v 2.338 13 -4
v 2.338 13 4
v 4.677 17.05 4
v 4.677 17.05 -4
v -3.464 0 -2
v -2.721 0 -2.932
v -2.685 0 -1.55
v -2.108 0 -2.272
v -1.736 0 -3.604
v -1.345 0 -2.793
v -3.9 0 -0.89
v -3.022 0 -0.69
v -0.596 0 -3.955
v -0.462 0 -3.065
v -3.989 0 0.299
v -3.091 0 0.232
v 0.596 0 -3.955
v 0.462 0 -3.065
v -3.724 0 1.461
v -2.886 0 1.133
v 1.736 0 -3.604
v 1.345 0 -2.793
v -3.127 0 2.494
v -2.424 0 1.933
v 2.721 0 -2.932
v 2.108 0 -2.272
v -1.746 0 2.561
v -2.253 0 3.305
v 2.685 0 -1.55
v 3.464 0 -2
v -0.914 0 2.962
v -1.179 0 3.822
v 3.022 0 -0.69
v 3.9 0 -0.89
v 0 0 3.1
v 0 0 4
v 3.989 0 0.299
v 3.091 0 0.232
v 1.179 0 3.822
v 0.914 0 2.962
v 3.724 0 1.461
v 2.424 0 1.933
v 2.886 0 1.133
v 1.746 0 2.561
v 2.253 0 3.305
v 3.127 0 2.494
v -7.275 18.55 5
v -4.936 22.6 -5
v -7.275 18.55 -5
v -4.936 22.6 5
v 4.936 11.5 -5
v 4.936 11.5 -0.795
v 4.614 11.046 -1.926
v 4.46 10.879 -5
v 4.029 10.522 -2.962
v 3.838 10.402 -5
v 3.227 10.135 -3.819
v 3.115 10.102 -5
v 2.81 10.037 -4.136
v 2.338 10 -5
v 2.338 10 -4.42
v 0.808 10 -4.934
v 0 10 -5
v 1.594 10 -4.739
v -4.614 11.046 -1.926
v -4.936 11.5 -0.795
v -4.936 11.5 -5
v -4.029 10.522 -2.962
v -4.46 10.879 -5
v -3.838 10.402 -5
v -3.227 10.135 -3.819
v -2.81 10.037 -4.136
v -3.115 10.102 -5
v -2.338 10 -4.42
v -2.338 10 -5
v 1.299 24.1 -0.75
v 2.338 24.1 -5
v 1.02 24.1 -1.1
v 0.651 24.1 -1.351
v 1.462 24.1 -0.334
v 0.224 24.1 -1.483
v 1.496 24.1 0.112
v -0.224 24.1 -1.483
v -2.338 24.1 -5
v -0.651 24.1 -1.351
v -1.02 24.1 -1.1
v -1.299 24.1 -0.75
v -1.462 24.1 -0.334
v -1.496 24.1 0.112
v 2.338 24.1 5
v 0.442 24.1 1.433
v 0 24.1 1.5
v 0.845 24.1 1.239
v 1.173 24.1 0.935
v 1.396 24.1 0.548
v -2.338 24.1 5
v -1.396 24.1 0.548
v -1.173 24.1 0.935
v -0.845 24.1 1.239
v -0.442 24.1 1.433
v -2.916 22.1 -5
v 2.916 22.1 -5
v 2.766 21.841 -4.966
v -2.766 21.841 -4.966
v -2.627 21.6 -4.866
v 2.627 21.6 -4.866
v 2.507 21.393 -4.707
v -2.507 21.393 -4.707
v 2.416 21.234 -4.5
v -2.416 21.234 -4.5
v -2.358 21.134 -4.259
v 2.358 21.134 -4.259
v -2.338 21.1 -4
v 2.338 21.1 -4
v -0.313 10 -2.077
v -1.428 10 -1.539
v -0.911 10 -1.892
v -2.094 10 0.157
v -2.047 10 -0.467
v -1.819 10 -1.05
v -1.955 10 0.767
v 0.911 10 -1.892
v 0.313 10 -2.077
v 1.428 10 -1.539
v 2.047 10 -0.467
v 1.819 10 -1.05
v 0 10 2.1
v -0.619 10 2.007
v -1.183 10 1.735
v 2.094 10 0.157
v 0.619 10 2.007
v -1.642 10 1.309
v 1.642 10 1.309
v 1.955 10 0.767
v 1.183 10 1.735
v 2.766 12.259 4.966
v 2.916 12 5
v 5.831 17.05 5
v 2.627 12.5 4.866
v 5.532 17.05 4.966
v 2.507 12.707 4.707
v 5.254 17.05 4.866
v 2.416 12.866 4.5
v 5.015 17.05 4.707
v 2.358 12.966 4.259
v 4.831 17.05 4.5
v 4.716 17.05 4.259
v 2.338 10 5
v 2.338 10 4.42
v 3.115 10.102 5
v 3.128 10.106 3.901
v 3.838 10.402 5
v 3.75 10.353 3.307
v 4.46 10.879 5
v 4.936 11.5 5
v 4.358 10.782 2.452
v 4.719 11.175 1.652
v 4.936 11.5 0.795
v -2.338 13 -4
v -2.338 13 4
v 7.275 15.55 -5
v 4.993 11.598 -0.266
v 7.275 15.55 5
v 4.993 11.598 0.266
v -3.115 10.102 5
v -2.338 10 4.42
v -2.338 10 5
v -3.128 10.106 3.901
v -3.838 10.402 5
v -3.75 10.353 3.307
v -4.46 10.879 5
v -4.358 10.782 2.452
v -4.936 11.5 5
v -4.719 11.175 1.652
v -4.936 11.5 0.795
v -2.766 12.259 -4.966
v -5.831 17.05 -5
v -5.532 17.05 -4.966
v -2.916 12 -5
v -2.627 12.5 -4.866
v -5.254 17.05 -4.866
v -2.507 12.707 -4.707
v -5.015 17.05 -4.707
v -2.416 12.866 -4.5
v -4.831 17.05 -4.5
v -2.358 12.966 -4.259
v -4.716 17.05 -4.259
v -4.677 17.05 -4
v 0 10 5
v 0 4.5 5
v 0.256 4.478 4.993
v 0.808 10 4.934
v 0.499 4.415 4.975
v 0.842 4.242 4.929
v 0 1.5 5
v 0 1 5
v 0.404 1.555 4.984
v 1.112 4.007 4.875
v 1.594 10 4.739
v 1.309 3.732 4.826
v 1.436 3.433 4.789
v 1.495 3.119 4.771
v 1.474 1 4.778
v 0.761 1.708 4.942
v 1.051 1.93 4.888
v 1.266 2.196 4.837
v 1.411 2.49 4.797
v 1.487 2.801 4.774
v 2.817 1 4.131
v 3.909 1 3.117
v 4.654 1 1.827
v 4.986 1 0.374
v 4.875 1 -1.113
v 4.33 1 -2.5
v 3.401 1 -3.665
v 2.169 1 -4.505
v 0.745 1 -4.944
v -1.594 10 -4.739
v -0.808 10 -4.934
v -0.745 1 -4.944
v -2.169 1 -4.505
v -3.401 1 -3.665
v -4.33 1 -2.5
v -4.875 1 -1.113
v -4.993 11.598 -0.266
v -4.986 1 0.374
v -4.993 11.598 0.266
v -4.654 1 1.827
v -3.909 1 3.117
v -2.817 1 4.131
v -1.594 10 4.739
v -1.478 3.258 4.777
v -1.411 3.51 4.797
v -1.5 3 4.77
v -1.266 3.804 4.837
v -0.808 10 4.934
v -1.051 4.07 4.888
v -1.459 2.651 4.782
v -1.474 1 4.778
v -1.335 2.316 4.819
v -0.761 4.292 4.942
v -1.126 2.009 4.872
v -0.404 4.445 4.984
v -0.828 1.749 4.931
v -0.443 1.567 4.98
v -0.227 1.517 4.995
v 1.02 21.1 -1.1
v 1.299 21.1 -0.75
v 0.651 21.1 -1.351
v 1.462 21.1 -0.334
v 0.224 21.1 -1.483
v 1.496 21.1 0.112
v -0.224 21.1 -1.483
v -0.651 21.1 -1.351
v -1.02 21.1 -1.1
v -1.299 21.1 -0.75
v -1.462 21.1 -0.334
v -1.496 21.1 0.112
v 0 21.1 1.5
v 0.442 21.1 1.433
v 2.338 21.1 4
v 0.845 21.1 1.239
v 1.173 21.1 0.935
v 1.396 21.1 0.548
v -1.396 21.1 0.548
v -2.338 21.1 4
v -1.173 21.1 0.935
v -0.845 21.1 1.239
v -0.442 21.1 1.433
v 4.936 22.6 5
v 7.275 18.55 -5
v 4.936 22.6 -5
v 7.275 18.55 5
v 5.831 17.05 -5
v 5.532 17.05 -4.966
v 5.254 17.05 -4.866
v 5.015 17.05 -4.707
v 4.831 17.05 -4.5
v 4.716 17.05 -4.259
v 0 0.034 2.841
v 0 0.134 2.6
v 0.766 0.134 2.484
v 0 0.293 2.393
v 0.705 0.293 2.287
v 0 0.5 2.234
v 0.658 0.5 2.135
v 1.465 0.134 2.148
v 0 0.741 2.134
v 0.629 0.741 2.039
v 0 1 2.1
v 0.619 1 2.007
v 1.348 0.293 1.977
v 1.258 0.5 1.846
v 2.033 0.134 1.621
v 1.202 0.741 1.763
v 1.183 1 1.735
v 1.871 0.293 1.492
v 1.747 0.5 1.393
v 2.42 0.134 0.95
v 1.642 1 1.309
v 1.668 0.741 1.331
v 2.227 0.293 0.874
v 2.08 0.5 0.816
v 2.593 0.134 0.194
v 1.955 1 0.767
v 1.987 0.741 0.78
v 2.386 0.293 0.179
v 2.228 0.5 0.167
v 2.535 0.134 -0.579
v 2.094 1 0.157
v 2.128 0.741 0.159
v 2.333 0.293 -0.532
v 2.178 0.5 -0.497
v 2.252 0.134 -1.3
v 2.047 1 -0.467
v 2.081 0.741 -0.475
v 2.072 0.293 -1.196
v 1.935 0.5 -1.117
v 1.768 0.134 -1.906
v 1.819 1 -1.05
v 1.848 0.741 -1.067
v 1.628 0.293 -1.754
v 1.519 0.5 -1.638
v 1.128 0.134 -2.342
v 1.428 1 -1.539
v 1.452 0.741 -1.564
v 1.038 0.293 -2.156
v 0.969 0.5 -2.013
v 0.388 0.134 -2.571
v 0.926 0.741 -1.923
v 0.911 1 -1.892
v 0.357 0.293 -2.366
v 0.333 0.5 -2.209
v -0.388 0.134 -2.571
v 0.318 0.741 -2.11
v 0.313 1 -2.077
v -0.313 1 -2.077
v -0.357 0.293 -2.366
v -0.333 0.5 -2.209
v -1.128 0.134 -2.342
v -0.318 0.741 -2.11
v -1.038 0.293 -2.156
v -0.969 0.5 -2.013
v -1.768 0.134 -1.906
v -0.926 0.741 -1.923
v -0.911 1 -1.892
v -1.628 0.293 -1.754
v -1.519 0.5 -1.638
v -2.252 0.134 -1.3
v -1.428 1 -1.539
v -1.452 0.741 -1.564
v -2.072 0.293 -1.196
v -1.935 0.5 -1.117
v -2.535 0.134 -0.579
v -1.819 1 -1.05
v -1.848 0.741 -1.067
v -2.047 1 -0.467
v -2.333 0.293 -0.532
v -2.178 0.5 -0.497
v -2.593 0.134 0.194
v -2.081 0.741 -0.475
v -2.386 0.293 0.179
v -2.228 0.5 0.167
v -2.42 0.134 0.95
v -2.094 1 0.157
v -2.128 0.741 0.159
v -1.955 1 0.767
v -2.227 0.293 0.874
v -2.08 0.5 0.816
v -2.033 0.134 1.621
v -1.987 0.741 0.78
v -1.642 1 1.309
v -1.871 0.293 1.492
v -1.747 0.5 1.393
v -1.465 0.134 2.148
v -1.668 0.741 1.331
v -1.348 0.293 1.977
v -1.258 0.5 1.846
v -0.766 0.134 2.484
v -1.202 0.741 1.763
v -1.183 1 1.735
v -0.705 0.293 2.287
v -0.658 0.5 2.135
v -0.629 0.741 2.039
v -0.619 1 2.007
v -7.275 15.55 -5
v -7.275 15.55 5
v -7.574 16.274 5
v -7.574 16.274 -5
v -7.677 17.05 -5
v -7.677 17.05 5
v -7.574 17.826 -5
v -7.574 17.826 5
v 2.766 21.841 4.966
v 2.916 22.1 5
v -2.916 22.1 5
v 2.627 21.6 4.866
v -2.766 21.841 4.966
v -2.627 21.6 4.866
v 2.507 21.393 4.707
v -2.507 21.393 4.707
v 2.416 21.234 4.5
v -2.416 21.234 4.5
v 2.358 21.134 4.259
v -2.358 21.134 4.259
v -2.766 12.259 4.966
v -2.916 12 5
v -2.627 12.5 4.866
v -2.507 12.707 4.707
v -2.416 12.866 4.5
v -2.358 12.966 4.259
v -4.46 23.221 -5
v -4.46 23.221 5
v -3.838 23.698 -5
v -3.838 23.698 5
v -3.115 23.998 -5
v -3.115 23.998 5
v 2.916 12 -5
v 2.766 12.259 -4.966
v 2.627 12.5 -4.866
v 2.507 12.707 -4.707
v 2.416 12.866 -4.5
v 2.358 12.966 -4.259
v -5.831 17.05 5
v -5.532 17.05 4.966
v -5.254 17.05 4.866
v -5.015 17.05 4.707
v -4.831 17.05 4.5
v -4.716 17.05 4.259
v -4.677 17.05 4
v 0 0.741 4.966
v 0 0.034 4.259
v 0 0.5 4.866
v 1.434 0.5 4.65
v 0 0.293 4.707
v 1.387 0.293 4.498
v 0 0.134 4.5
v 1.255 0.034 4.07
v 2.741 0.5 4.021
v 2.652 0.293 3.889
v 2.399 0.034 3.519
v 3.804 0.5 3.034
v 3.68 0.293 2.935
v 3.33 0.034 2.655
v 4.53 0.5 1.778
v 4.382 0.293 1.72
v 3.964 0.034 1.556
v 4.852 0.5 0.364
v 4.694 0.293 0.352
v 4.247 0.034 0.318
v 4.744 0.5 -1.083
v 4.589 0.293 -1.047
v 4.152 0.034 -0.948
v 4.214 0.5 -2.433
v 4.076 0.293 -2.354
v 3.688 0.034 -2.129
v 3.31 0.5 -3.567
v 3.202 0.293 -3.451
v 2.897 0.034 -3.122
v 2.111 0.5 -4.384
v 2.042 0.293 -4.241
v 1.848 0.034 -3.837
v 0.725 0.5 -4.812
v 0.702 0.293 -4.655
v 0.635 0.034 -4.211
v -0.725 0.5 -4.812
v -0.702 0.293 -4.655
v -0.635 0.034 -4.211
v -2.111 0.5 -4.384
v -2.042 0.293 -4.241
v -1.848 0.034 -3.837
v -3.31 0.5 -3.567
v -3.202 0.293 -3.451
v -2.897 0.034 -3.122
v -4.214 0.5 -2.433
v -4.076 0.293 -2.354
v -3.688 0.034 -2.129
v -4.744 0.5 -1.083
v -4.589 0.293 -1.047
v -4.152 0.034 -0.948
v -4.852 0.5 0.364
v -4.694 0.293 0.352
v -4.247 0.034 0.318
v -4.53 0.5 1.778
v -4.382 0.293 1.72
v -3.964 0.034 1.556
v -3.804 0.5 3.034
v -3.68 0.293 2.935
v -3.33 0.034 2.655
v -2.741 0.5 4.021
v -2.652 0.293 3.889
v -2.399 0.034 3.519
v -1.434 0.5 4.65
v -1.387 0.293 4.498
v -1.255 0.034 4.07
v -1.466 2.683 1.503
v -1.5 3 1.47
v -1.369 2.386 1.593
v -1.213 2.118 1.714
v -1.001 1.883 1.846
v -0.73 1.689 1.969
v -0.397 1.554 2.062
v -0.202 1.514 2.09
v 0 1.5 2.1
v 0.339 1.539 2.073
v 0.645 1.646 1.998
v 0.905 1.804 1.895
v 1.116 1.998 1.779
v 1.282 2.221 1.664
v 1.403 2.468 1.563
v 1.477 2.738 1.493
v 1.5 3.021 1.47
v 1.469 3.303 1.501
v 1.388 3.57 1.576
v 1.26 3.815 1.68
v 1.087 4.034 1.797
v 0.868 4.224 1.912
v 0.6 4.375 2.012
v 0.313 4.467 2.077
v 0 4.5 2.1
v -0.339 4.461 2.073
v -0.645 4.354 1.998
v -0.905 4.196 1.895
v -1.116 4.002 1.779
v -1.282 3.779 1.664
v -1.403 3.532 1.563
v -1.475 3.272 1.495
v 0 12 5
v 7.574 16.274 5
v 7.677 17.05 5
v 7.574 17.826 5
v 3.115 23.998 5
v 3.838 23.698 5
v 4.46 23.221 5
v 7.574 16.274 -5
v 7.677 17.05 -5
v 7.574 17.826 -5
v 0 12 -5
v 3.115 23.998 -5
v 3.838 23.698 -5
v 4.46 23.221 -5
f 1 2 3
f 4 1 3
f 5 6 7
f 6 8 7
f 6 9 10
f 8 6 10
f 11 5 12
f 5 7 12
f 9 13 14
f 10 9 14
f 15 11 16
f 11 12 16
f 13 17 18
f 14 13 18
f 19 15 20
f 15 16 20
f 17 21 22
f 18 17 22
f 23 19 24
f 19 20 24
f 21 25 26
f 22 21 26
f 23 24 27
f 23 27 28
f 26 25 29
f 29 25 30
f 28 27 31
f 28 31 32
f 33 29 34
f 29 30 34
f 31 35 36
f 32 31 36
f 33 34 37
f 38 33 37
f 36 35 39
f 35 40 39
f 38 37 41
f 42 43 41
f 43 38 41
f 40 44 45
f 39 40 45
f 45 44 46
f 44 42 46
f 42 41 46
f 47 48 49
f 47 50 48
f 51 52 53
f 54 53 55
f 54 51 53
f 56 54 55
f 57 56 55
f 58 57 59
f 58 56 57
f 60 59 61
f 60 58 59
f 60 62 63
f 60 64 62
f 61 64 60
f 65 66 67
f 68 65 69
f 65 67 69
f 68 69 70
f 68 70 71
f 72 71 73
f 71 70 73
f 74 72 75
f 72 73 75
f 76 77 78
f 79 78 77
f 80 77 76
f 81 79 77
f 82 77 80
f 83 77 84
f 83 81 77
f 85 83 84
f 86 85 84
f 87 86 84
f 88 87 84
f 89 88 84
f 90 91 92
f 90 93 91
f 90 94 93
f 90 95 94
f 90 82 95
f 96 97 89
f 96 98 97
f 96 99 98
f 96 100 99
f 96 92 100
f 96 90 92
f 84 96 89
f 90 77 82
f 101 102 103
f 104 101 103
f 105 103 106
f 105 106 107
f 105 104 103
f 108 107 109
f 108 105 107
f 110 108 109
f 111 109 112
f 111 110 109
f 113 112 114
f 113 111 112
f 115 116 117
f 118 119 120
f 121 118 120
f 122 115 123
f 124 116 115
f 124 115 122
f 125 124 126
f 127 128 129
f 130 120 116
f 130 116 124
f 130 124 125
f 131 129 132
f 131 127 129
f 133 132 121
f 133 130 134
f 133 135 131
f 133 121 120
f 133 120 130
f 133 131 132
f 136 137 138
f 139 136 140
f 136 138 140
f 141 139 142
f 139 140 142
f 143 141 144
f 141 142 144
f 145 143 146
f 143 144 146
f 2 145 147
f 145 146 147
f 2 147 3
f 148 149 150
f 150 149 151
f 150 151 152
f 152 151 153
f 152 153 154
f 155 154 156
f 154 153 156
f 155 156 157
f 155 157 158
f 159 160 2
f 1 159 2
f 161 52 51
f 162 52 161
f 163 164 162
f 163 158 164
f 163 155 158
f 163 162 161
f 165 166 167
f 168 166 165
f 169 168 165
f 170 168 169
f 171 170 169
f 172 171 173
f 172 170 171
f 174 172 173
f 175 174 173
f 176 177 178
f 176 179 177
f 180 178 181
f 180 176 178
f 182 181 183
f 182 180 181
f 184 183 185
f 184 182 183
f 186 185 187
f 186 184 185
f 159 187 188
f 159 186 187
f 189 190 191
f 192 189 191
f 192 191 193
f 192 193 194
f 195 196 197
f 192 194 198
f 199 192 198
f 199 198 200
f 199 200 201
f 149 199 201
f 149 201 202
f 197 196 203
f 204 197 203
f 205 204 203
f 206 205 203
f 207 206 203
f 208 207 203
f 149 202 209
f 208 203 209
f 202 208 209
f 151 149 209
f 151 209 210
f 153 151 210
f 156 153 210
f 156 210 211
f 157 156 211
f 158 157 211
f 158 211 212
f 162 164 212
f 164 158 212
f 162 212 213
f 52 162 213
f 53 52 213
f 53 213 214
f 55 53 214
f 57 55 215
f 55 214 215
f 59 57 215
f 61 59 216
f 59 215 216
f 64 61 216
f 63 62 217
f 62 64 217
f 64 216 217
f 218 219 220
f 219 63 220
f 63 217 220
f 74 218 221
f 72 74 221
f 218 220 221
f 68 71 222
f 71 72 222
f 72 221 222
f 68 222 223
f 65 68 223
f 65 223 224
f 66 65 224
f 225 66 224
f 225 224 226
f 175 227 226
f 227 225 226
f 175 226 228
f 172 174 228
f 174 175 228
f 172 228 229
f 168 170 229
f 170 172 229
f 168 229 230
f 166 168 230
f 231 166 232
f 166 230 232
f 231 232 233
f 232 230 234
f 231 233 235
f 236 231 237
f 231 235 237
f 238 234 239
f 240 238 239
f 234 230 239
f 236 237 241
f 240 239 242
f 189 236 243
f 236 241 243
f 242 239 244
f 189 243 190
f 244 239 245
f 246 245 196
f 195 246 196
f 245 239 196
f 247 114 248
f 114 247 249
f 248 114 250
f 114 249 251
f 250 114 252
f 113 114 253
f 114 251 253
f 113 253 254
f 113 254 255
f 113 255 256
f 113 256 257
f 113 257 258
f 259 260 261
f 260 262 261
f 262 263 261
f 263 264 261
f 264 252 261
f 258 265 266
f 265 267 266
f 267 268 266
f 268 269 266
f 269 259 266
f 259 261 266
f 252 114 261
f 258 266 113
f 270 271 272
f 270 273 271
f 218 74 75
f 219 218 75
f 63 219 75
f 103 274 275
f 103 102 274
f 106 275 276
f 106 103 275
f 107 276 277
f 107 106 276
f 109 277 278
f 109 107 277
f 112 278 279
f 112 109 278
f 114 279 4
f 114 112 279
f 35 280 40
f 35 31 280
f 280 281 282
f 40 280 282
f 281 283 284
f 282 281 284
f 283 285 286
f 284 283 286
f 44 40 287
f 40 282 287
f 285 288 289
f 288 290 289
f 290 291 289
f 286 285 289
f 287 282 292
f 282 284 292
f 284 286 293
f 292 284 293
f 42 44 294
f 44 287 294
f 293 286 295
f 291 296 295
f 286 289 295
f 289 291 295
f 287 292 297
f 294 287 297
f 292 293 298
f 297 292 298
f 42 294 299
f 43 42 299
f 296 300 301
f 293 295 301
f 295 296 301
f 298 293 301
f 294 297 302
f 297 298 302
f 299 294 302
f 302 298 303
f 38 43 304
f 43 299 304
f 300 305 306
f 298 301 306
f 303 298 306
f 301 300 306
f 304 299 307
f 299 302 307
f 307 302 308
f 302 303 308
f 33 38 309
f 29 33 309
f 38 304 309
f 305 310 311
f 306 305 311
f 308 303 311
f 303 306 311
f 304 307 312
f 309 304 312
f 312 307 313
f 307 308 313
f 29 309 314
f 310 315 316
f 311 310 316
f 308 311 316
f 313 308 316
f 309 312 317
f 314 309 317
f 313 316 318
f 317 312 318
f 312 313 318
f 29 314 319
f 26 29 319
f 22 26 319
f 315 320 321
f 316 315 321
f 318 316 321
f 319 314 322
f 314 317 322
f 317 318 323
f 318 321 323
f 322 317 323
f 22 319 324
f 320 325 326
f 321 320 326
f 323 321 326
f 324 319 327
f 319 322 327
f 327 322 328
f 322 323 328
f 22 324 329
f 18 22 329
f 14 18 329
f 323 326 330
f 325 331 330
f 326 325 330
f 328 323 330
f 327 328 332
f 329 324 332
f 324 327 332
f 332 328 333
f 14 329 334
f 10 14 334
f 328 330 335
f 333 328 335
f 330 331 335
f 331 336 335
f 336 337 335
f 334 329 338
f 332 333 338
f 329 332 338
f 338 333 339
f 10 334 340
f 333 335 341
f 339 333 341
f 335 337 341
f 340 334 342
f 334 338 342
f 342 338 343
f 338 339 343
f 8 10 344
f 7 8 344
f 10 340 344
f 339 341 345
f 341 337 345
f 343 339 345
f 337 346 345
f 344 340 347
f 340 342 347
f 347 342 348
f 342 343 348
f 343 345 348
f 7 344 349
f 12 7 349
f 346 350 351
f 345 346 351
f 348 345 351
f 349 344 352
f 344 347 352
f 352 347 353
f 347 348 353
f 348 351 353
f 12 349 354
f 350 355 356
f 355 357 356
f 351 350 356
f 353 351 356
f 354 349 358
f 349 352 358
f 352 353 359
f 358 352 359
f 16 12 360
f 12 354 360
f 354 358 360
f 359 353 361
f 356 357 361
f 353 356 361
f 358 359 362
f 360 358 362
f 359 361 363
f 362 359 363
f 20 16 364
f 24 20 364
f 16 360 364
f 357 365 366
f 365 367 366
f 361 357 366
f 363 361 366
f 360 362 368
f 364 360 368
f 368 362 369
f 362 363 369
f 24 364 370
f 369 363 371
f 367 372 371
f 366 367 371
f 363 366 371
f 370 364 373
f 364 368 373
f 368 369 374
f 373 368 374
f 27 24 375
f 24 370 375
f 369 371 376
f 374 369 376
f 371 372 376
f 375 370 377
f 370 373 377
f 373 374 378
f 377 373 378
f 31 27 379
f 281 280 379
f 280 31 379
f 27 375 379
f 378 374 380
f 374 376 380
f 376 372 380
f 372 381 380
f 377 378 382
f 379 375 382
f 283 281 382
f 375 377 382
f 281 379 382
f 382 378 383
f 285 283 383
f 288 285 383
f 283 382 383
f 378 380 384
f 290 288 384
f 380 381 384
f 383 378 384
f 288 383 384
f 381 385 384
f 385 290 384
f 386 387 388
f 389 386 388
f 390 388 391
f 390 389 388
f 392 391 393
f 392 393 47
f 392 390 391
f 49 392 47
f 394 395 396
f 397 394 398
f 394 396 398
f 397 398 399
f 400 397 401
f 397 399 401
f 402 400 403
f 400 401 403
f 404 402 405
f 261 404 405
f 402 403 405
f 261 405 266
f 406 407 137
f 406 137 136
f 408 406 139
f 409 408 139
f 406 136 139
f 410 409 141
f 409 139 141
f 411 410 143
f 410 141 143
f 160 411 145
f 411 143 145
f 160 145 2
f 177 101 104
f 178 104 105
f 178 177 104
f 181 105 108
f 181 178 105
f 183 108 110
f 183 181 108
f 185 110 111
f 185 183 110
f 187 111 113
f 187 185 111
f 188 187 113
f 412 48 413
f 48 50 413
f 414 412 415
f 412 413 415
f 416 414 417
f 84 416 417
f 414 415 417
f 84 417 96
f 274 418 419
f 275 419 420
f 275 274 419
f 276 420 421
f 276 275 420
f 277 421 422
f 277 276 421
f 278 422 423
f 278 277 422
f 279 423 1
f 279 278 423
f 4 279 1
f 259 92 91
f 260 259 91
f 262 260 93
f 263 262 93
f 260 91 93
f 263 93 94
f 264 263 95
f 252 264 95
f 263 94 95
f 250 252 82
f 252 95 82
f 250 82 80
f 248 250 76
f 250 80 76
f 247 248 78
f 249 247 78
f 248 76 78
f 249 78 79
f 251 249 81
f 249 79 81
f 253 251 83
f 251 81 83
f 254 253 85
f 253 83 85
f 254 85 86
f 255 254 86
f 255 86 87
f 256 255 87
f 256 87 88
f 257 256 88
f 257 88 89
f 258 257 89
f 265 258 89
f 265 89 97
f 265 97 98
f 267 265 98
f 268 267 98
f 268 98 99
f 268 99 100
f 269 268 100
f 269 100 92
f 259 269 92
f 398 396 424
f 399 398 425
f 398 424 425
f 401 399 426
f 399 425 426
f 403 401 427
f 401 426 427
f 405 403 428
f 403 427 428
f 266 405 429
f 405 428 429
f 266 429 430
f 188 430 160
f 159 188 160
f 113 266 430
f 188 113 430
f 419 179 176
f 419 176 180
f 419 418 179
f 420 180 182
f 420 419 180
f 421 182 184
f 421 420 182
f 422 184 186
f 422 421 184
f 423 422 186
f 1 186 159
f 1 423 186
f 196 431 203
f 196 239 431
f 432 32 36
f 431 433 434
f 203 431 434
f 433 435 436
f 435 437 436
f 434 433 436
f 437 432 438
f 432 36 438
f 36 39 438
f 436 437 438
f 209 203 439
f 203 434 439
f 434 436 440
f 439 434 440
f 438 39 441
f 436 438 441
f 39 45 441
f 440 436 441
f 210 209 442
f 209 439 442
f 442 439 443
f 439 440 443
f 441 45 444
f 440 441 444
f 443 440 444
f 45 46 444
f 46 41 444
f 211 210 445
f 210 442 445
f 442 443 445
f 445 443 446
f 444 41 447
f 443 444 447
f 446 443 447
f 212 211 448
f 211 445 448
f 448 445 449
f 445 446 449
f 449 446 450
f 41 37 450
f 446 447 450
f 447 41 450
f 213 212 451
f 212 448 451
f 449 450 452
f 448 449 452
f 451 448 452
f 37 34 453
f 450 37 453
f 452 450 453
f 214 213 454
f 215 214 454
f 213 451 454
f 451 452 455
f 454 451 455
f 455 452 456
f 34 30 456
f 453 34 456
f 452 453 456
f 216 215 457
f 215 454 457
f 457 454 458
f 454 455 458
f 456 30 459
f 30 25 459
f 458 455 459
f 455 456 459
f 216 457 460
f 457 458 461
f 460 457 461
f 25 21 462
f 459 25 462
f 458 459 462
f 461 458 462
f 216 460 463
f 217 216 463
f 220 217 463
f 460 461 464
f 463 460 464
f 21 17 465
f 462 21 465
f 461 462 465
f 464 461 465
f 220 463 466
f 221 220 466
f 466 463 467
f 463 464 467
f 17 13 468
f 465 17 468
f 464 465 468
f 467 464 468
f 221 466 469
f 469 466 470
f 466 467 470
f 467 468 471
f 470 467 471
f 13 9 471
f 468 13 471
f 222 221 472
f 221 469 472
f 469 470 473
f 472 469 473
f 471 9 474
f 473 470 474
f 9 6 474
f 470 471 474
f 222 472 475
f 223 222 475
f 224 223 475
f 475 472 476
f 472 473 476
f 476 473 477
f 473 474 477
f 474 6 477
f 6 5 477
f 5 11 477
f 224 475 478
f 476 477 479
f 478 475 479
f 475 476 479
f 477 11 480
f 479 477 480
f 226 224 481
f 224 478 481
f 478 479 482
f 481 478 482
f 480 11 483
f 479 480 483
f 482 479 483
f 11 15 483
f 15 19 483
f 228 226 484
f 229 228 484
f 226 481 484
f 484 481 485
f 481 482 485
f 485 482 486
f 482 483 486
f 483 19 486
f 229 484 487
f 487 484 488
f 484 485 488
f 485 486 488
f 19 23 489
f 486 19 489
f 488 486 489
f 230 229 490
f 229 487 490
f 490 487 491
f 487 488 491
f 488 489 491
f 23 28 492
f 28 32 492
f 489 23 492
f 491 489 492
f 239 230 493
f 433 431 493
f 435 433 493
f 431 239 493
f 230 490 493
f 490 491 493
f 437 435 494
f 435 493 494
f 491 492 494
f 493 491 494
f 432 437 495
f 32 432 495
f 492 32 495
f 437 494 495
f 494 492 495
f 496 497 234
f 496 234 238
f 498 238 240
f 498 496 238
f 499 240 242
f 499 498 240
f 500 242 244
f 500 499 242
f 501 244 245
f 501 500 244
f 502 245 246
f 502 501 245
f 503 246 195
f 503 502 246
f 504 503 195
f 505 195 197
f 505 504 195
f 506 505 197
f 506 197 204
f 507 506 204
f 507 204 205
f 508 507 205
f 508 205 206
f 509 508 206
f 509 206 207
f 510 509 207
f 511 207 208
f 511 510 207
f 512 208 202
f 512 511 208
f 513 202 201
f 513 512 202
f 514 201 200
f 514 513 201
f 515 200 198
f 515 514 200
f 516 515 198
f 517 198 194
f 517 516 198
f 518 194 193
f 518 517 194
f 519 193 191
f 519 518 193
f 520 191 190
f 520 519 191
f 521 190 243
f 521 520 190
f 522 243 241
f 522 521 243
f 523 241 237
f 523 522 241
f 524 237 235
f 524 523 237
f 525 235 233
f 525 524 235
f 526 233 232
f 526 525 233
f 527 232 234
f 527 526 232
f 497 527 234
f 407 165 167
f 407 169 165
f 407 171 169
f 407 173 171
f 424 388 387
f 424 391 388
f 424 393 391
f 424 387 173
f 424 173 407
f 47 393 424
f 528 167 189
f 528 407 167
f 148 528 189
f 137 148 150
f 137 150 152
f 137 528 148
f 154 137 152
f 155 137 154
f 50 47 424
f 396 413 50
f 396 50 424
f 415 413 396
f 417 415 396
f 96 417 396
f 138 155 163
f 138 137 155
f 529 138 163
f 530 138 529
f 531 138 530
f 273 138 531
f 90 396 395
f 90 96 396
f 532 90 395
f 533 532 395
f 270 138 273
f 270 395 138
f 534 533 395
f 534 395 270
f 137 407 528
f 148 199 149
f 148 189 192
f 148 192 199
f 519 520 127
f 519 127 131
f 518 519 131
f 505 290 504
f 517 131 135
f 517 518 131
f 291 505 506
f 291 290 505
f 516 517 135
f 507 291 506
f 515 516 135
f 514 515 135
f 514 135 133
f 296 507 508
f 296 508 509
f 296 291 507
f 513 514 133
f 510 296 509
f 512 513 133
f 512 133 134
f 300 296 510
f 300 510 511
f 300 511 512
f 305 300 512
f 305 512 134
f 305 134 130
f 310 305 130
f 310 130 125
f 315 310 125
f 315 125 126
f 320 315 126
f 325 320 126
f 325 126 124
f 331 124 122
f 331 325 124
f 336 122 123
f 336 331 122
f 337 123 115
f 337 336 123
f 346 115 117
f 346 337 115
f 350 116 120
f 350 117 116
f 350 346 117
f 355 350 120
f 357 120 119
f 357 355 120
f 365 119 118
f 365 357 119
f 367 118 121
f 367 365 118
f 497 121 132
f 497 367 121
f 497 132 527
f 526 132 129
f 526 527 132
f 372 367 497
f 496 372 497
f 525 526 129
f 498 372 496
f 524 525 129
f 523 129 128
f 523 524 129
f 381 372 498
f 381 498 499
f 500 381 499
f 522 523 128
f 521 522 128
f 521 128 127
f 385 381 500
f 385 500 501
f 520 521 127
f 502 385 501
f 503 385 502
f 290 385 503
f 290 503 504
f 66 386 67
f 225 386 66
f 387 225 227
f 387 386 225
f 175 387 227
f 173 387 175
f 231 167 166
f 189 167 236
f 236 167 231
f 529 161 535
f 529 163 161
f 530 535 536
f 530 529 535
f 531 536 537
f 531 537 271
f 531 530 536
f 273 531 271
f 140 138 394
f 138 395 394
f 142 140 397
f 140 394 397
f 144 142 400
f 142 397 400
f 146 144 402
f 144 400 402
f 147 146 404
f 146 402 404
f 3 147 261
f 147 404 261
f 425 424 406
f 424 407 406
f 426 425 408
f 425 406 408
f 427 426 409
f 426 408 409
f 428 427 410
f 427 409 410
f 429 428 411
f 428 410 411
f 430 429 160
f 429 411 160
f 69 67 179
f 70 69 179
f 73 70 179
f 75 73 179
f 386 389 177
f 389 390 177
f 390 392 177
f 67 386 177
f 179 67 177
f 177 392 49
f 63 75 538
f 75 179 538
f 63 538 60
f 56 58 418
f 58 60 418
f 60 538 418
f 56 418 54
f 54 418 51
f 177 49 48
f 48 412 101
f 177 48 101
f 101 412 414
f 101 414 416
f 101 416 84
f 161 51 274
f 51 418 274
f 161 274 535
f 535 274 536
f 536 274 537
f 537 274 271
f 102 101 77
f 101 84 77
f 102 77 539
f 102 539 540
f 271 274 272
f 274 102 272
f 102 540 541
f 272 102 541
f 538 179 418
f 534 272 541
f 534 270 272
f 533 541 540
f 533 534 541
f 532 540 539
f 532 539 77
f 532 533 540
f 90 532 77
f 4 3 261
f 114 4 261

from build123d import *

# Parameters (mm, degrees)
ESBO_O1_R                = 5
ESBO_O1_R_2              = 2.1
RESSALTO_EXTRUS_O1_DEPTH = 12
ESBO_O2_R                = 1.5
CORTE_EXTRUS_O1_DEPTH    = 10
RESSALTO_EXTRUS_O2_DEPTH = 5
ESBO_O4_R                = 1.5
CORTE_EXTRUS_O2_DEPTH    = 5
FILETE1_R                = 1
FILETE2_R                = 3


with BuildPart() as part:
    # Esboço1 → Ressalto-extrusão1 (new body)
    with BuildSketch(Plane(origin=(0, 0, 0), x_dir=(1, 0, 0), z_dir=(0, 1, 0))):
        with Locations(Location((0, 0, 0), (0, 0, 270))):
            Circle(ESBO_O1_R)
        with Locations(Location((0, 0, 0), (0, 0, 270))):
            Circle(ESBO_O1_R_2, mode=Mode.SUBTRACT)
    extrude(amount=RESSALTO_EXTRUS_O1_DEPTH)

    # Esboço2 → Corte-extrusão1 (cut)
    with BuildSketch(Plane.XY):
        with Locations(Location((0, 3, 0), (0, 0, 180))):
            Circle(ESBO_O2_R)
    extrude(amount=CORTE_EXTRUS_O1_DEPTH, mode=Mode.SUBTRACT)

    # Esboço3 → Ressalto-extrusão2 (add, symmetric)
    with BuildSketch(Plane.XY):
        Polygon((4.070319398, 10), (8.140638796, 17.05), (4.070319398, 24.1), (-4.070319398, 24.1), (-8.140638796, 17.05), (-4.070319398, 10), align=None)
        Polygon((2.33826859, 13), (4.67653718, 17.05), (2.33826859, 21.1), (-2.33826859, 21.1), (-4.67653718, 17.05), (-2.33826859, 13), align=None, mode=Mode.SUBTRACT)
    extrude(amount=RESSALTO_EXTRUS_O2_DEPTH, both=True)

    # Esboço4 → Corte-extrusão2 (cut)
    with BuildSketch(Plane(origin=(0, 24.1, 0), x_dir=(1, 0, 0), z_dir=(0, 1, 0))):
        with Locations(Location((0, 0, 0), (0, 0, 270))):
            Circle(ESBO_O4_R)
    extrude(amount=-CORTE_EXTRUS_O2_DEPTH, mode=Mode.SUBTRACT)

    # Filete1
    filete1_edges = [part.edges().sort_by_distance(p)[0] for p in [
        (0, 0, -5),
        (0, 13, -5),
        (3.507402885, 15.025, -5),
        (3.507402885, 19.075, -5),
        (0, 21.1, -5),
        (-3.507402885, 19.075, -5),
        (-3.507402885, 15.025, -5),
        (0, 13, 5),
        (3.507402885, 15.025, 5),
        (3.507402885, 19.075, 5),
        (0, 21.1, 5),
        (-3.507402885, 19.075, 5),
        (-3.507402885, 15.025, 5),
        (0, 0, -2.1),
    ]]
    fillet(filete1_edges, radius=FILETE1_R - 0.0001)  # a hair under: the kernel refuses the full size

    # Filete2
    filete2_edges = [part.edges().sort_by_distance(p)[0] for p in [
        (-4.070319398, 10, -3.95193836),
        (-4.070319398, 10, 3.95193836),
        (8.140638796, 17.05, 0),
        (4.070319398, 10, 3.95193836),
        (4.070319398, 10, -3.95193836),
        (4.070319398, 24.1, 0),
        (-4.070319398, 24.1, 0),
        (-8.140638796, 17.05, 0),
    ]]
    fillet(filete2_edges, radius=FILETE2_R)


solid = part.part
